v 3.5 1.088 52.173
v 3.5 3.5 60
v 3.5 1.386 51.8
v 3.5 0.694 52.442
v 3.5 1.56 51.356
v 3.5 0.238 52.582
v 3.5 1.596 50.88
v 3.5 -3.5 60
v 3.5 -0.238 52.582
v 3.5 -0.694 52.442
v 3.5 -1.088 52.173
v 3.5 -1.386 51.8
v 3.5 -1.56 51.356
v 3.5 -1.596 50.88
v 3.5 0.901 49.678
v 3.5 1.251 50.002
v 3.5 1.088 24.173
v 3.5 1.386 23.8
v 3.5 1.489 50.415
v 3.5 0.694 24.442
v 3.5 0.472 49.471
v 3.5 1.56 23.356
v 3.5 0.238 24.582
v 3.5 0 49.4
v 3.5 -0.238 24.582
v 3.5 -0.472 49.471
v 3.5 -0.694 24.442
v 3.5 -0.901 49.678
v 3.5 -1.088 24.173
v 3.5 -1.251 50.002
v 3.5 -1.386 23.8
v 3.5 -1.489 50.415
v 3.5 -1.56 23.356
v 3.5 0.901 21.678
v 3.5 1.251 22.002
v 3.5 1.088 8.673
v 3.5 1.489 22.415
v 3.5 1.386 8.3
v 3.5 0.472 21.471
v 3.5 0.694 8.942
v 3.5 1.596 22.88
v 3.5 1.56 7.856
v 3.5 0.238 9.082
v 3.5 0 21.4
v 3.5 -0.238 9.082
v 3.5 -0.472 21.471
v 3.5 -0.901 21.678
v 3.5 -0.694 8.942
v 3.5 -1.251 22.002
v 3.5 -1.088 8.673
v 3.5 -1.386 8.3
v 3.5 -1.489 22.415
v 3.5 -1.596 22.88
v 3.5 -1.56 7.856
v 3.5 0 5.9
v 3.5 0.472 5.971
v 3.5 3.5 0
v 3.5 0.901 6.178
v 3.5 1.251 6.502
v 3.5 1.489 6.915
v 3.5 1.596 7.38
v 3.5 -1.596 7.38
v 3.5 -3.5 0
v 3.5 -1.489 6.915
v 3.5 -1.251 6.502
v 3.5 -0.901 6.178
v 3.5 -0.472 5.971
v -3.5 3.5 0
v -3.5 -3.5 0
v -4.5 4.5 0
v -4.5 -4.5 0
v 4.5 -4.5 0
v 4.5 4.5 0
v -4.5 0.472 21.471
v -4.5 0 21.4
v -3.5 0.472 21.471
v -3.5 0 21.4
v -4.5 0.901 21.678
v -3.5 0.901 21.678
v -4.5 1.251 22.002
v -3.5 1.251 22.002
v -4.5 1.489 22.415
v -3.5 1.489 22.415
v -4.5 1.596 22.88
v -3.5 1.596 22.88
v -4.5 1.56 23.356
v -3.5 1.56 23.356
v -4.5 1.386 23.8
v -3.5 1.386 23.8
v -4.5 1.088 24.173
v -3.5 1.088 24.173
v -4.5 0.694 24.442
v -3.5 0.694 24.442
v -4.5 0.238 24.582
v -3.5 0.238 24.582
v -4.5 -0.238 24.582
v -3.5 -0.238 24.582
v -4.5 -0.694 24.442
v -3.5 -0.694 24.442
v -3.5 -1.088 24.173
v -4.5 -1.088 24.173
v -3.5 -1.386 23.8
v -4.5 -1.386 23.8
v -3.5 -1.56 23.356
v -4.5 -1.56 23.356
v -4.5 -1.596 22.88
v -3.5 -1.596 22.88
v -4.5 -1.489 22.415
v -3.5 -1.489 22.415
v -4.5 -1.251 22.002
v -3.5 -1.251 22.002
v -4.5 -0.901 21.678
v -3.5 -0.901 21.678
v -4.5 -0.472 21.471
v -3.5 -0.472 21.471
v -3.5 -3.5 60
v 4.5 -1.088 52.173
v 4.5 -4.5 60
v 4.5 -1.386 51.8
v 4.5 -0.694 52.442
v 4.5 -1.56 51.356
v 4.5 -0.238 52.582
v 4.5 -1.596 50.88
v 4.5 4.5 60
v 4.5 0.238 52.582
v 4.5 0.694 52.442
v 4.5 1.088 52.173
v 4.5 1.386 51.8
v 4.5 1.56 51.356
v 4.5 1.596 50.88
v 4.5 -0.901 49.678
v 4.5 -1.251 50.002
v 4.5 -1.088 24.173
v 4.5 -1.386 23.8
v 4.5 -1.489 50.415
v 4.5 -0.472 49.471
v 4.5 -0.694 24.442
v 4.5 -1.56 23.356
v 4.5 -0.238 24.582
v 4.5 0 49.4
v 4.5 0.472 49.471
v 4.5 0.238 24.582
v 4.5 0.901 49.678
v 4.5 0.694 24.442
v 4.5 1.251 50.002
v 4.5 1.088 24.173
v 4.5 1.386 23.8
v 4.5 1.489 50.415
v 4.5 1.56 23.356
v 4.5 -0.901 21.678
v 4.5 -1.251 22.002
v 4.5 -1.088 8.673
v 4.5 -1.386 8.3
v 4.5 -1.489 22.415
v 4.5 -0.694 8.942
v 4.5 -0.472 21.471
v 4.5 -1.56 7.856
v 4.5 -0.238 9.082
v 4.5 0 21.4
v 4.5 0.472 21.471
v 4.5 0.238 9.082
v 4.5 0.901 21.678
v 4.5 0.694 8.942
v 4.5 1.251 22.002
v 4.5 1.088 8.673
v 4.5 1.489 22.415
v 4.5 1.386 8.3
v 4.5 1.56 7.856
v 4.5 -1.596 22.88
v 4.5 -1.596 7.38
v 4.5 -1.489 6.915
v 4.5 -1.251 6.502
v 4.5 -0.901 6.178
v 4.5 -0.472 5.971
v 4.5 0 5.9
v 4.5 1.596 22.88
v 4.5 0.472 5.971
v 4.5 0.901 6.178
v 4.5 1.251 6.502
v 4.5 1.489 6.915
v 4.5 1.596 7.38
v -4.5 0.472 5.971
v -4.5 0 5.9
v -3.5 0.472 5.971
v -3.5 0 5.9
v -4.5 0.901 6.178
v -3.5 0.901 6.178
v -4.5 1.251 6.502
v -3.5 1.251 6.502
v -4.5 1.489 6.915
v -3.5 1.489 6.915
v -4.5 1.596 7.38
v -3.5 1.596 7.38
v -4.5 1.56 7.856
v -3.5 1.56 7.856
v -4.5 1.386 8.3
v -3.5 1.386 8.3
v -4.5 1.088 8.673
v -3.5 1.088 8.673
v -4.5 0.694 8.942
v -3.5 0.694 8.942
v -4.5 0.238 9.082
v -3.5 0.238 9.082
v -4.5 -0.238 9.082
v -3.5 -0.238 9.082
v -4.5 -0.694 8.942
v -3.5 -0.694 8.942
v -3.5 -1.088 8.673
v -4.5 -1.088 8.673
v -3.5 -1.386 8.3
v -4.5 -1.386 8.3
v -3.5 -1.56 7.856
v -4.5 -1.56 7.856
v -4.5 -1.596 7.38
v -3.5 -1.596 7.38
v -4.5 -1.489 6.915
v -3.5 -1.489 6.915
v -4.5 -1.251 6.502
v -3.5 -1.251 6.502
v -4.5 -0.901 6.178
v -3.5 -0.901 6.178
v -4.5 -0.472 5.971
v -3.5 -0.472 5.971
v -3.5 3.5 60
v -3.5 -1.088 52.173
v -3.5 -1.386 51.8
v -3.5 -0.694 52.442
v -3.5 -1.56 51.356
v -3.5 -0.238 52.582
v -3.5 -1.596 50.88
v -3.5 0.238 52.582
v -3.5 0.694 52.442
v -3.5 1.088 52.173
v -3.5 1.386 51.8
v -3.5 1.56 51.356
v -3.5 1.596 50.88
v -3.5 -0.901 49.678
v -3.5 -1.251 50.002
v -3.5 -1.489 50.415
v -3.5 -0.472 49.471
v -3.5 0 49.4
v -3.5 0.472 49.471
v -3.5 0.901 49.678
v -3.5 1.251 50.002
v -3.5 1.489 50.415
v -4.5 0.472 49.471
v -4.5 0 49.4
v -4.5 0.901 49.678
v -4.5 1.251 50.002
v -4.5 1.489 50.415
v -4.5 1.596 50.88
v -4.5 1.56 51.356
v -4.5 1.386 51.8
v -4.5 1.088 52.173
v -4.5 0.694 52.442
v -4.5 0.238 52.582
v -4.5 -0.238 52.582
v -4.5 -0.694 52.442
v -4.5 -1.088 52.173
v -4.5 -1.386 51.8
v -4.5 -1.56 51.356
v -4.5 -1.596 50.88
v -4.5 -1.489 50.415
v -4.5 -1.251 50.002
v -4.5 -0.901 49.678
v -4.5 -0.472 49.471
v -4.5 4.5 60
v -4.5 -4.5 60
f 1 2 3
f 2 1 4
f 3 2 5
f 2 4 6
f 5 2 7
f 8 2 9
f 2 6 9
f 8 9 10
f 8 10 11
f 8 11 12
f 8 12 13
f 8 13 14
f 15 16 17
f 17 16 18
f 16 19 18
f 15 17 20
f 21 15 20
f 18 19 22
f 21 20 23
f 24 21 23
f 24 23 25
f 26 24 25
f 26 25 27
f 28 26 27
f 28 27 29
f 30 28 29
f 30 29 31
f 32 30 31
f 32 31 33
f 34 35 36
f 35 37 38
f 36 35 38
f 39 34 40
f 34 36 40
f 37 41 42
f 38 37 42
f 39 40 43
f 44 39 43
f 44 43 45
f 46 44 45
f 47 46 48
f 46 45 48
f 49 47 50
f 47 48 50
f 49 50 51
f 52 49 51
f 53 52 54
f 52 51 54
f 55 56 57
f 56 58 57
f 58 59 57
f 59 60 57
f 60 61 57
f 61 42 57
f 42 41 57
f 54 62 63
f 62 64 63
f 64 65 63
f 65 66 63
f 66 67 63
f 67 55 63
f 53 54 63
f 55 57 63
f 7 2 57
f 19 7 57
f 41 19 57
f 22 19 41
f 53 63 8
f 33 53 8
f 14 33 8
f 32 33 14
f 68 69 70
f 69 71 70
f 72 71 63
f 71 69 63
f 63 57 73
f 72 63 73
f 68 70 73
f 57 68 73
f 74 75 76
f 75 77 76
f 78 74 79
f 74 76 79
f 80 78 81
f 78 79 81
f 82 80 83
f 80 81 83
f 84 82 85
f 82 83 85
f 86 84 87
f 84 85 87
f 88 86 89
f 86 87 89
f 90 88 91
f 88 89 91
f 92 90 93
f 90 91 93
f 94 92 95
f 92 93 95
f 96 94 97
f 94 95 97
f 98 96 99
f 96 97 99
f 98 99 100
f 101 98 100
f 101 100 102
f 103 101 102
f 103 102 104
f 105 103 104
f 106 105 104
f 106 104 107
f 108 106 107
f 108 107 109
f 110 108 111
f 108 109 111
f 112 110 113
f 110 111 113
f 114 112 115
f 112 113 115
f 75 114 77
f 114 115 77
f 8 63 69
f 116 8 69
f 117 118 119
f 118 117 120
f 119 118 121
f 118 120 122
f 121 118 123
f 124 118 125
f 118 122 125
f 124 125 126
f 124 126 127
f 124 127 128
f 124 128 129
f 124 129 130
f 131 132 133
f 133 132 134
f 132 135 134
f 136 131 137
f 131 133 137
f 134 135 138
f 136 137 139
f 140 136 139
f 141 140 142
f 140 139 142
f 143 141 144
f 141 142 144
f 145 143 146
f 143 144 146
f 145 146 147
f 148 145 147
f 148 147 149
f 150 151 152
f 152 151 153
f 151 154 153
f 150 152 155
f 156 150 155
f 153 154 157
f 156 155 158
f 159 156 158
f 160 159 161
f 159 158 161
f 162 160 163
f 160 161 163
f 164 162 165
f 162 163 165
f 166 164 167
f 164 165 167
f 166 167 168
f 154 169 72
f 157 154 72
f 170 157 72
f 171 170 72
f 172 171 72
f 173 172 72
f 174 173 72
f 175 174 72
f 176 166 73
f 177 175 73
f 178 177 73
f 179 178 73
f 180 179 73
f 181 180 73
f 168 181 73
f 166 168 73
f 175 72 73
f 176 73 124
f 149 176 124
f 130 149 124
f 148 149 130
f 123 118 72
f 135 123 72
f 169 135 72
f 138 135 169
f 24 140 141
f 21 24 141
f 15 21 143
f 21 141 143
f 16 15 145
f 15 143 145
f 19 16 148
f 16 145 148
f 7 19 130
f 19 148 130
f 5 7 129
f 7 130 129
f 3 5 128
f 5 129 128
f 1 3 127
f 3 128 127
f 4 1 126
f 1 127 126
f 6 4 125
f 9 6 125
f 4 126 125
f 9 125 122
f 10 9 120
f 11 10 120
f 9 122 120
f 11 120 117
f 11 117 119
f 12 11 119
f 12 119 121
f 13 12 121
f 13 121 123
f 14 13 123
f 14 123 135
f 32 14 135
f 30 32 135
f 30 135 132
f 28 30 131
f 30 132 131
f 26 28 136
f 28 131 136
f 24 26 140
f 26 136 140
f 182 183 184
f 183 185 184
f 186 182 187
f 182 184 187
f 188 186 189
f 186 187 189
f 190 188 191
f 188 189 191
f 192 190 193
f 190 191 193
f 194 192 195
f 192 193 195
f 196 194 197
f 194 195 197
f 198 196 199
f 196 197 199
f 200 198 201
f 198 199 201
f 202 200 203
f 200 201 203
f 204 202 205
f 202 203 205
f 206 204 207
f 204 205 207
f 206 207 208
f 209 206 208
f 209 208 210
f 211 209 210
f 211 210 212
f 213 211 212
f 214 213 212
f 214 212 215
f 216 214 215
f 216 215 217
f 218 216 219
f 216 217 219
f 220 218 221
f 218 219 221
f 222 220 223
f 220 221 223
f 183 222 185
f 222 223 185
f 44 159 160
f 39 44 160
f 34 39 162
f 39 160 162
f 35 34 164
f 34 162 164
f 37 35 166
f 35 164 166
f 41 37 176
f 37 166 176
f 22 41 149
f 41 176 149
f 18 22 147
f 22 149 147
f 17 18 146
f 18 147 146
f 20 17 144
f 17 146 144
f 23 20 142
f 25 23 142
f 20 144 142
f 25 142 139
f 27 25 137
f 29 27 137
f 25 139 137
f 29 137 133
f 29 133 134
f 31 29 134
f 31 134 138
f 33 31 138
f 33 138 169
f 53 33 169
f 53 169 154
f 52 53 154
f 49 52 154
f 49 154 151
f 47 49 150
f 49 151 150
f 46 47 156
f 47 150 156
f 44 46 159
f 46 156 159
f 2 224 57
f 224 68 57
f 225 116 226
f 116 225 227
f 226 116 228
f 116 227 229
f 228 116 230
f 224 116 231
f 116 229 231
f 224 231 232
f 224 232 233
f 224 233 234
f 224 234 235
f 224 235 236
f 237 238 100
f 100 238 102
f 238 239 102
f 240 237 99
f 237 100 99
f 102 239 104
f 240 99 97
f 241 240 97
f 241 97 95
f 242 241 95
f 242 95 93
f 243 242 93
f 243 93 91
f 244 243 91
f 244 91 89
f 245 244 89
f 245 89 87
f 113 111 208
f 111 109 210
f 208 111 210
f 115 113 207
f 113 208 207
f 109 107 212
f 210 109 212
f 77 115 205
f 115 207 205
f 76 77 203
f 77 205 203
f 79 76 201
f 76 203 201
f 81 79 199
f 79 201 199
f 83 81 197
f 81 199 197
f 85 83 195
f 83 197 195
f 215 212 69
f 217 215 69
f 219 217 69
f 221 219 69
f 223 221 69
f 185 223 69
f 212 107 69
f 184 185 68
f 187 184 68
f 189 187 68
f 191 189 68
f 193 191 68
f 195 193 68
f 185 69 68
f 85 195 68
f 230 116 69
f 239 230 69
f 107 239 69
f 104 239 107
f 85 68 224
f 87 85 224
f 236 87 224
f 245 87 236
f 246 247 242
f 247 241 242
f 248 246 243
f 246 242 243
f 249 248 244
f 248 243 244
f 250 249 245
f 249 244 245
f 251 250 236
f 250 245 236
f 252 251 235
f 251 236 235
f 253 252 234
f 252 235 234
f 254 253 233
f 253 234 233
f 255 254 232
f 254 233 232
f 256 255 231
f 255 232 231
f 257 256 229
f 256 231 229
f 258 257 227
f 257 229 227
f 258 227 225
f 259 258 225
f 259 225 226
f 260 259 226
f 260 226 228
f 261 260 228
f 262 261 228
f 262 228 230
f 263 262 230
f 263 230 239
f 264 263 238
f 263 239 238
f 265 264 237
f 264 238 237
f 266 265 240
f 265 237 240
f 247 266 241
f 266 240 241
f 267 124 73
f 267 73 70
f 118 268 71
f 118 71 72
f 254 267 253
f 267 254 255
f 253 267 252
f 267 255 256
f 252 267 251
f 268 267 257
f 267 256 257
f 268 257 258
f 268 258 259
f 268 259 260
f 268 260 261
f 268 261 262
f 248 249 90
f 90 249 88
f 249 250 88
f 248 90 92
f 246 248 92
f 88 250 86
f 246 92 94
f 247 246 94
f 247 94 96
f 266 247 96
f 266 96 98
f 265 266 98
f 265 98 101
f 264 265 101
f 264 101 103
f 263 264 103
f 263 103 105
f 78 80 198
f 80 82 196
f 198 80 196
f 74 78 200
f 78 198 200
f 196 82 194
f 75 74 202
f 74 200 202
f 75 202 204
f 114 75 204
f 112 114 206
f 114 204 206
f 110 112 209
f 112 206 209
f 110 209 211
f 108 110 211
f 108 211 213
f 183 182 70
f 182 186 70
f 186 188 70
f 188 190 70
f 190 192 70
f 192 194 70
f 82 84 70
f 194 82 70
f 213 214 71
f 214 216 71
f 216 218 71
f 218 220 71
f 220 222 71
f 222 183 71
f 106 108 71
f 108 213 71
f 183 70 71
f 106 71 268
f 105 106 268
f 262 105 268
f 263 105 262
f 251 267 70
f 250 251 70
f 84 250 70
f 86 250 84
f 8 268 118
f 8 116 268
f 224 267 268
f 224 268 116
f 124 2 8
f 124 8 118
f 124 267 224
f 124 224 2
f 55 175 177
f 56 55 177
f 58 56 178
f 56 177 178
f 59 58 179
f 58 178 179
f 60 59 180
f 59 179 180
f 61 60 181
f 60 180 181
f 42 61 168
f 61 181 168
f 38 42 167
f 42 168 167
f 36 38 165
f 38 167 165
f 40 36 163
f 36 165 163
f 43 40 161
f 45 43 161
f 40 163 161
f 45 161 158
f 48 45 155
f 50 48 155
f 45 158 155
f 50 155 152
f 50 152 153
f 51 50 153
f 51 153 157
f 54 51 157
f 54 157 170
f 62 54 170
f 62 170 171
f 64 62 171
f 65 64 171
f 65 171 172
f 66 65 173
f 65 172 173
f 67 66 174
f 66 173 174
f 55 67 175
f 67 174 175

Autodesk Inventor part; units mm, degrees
ref_plane "YZ Plane" through (0, 0, 0) normal (1, 0, 0) x (0, 1, 0)
ref_plane "XZ Plane" through (0, 0, 0) normal (0, 1, 0) x (-1, 0, 0)
ref_plane "XY Plane" through (0, 0, 0) normal (0, 0, 1) x (1, 0, 0)
sketch "スケッチ1" plane through (0, 0, 0) normal (0, 0, 1) x (1, 0, 0)
  line L0 (4.5, 4.5) -> (-4.5, 4.5)
  line L1 (-4.5, 4.5) -> (-4.5, -4.5)
  line L2 (-4.5, -4.5) -> (4.5, -4.5)
  line L3 (4.5, -4.5) -> (4.5, 4.5)
  line L4 (4.5, 4.5) -> (-4.5, -4.5) construction
  line L5 (-4.5, 4.5) -> (4.5, -4.5) construction
  line L6 (-3.5, 3.5) -> (3.5, 3.5)
  line L7 (3.5, 3.5) -> (3.5, -3.5)
  line L8 (3.5, -3.5) -> (-3.5, -3.5)
  line L9 (-3.5, -3.5) -> (-3.5, 3.5)
  point P0 (0, 0)
  dimension "d0" = 9
  dimension "d1" = 9
  dimension "d2" = 1
extrude "押し出し1" add sketch "スケッチ1" along normal blind 60
sketch "スケッチ2" plane through (4.5, -4.5, 0) normal (1, 0, 0) x (0, 0, -1)
  circle A0 centre (-7.5, 4.5) radius 1.6
  circle A1 centre (-23, 4.5) radius 1.6
  circle A2 centre (-51, 4.5) radius 1.6
  line L0 (0, 0) -> (0, 9) projected
  point P0 (0, 4.5)
  point P1 (0, 4.5)
  dimension "d5" = 3.2
  dimension "d6" = 3.2
  dimension "d7" = 3.2
  dimension "d9" = 7.5
  dimension "d11" = 15.5
  dimension "d12" = 28
extrude "押し出し2" cut sketch "スケッチ2" against normal through all
properties part number "ハンド_角柱1" material "アルミニウム 6061"
